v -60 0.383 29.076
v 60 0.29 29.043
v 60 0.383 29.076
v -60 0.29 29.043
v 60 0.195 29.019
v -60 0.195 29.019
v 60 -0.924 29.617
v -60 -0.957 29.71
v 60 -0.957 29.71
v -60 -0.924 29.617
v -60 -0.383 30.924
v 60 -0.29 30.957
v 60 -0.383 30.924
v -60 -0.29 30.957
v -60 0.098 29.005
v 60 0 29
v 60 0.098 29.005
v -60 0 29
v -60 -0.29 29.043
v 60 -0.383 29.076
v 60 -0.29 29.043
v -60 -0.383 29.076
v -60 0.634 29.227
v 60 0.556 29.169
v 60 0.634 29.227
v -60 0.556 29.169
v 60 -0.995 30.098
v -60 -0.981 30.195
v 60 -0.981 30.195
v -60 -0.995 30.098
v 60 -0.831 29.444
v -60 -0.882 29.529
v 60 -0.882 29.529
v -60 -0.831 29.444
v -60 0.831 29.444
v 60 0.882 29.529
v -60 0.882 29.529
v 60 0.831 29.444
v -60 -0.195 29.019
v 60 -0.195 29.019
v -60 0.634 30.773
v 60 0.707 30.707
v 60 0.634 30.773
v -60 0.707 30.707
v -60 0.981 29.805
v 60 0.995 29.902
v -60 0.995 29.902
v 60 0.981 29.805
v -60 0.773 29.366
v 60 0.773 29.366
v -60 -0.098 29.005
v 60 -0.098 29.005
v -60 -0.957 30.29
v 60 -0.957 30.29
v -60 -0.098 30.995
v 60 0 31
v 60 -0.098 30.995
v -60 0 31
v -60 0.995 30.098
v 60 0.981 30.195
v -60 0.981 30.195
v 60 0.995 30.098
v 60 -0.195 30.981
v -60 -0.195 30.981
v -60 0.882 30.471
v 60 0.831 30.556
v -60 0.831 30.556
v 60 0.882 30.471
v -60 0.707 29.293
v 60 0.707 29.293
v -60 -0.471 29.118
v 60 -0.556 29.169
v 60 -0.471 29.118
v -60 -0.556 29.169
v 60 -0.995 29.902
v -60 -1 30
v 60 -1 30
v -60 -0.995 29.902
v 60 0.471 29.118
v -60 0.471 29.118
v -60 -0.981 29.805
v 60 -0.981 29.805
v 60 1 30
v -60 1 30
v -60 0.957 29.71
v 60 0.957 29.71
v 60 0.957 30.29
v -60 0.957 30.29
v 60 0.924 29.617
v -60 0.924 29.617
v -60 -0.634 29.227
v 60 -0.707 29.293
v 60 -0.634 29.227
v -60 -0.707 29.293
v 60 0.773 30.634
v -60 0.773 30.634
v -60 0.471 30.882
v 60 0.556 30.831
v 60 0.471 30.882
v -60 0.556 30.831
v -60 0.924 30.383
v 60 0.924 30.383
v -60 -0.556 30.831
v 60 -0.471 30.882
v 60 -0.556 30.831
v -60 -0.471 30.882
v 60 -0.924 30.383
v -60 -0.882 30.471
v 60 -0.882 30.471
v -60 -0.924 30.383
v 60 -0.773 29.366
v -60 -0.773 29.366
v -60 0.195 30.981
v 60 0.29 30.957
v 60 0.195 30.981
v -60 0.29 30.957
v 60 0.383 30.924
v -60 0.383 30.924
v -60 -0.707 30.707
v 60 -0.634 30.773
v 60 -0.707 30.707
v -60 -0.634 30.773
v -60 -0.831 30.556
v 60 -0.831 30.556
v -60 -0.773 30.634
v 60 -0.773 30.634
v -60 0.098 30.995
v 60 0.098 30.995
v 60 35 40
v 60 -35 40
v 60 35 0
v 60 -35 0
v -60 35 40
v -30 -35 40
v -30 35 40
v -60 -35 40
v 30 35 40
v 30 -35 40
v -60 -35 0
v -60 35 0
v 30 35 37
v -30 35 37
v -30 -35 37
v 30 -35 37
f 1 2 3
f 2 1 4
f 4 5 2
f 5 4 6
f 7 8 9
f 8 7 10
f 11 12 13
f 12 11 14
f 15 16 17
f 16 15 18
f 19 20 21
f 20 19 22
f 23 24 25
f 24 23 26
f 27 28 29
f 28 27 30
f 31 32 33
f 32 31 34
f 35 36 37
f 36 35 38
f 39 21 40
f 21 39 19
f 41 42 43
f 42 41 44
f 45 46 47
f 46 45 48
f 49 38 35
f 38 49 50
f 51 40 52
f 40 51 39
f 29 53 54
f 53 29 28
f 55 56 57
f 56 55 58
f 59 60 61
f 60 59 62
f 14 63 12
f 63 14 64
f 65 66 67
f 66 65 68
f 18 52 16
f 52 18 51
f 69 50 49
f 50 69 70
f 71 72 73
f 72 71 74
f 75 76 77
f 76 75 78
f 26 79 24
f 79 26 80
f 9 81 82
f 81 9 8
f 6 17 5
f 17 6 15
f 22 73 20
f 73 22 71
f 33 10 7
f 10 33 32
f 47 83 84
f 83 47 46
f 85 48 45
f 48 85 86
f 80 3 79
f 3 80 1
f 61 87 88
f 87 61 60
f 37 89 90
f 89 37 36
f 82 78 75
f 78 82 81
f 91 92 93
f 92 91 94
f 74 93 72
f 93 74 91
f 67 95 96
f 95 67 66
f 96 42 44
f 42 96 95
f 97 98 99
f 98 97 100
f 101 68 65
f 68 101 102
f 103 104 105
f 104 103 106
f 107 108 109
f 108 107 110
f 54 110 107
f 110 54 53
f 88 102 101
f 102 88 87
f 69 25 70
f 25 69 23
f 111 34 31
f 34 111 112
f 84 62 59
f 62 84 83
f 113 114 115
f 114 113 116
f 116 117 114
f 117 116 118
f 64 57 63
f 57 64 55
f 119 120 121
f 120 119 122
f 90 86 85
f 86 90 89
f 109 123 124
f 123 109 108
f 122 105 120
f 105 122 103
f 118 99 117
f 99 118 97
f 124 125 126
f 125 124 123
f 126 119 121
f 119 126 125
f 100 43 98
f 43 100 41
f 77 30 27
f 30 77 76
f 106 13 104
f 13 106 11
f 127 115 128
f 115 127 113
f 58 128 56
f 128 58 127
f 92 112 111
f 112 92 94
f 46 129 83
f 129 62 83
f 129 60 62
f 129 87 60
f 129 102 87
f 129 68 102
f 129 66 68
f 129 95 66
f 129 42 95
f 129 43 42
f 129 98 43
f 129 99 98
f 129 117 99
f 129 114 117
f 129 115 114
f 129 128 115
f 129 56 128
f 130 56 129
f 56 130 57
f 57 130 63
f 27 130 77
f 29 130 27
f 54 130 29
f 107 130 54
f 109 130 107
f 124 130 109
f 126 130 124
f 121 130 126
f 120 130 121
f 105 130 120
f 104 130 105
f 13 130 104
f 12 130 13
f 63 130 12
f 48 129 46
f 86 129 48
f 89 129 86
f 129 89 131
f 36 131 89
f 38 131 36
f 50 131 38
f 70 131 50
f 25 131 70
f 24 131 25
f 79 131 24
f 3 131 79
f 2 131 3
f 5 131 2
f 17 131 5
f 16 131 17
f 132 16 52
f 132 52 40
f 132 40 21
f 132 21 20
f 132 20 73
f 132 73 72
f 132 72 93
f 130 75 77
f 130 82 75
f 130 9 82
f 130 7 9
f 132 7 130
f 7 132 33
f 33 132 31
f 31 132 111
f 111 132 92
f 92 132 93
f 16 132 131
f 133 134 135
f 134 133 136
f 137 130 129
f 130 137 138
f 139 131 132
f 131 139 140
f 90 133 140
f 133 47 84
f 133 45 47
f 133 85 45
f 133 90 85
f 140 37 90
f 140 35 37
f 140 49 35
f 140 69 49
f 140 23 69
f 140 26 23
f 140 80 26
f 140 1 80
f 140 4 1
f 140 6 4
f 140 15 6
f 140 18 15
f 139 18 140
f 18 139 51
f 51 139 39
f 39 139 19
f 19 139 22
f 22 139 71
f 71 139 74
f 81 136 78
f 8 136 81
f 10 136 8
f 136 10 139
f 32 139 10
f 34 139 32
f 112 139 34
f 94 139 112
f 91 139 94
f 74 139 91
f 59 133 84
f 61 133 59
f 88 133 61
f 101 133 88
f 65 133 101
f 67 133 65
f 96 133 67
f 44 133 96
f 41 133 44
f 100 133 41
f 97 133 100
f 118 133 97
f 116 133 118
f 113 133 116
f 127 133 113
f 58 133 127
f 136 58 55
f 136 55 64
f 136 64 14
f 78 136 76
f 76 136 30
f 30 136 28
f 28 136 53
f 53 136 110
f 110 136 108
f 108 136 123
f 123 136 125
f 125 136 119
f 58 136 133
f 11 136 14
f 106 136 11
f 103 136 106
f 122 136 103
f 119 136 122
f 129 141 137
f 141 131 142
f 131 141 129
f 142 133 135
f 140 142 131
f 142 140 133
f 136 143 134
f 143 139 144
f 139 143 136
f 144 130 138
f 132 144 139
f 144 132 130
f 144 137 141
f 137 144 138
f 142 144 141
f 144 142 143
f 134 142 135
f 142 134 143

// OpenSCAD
// Mini horizontal gel-electrophoresis buffer tank
// Print orientation: open top facing up, resting on XY plane at z = 0

// ---------- Parameters ----------
outer_x   = 120;   // outer length in X
outer_y   = 70;    // outer width in Y
height    = 40;    // overall height in Z
wall      = 3;     // wall thickness
floor     = 3;     // floor thickness
plat_top  = 10;    // platform top height above inner floor
plat_x    = 60;    // platform length in X (centred)
hole_d    = 2;     // electrode hole diameter
eps       = 0.5;   // cutter overshoot past faces

$fn = 64;

// ---------- Derived ----------
inner_h = height - floor;              // inner floor height (z = 3)
plat_z  = inner_h + plat_top;          // platform top height (z = 13)
chamber_h = height - plat_z;           // buffer chamber height above platform (z = 27)

// ---------- Model ----------
difference() {
    // Main tank body
    translate([-outer_x/2, -outer_y/2, 0])
        cube([outer_x, outer_y, height]);

    // Open top
    translate([-outer_x/2 - eps, -outer_y/2 - eps, height])
        cube([outer_x + 2*eps, outer_y + 2*eps, wall]);

    // Raised platform for gel tray
    translate([-plat_x/2, -outer_y/2, inner_h])
        cube([plat_x, outer_y, plat_top]);

    // Electrode holes through end walls, along X at y = 0, z = 30
    for (sx = [-1, 1])
        translate([sx * (outer_x/2 - wall - eps), 0, 30])
            rotate([0, 90, 0])
                cylinder(d = hole_d, h = outer_x + 2*eps, center = true);
}
